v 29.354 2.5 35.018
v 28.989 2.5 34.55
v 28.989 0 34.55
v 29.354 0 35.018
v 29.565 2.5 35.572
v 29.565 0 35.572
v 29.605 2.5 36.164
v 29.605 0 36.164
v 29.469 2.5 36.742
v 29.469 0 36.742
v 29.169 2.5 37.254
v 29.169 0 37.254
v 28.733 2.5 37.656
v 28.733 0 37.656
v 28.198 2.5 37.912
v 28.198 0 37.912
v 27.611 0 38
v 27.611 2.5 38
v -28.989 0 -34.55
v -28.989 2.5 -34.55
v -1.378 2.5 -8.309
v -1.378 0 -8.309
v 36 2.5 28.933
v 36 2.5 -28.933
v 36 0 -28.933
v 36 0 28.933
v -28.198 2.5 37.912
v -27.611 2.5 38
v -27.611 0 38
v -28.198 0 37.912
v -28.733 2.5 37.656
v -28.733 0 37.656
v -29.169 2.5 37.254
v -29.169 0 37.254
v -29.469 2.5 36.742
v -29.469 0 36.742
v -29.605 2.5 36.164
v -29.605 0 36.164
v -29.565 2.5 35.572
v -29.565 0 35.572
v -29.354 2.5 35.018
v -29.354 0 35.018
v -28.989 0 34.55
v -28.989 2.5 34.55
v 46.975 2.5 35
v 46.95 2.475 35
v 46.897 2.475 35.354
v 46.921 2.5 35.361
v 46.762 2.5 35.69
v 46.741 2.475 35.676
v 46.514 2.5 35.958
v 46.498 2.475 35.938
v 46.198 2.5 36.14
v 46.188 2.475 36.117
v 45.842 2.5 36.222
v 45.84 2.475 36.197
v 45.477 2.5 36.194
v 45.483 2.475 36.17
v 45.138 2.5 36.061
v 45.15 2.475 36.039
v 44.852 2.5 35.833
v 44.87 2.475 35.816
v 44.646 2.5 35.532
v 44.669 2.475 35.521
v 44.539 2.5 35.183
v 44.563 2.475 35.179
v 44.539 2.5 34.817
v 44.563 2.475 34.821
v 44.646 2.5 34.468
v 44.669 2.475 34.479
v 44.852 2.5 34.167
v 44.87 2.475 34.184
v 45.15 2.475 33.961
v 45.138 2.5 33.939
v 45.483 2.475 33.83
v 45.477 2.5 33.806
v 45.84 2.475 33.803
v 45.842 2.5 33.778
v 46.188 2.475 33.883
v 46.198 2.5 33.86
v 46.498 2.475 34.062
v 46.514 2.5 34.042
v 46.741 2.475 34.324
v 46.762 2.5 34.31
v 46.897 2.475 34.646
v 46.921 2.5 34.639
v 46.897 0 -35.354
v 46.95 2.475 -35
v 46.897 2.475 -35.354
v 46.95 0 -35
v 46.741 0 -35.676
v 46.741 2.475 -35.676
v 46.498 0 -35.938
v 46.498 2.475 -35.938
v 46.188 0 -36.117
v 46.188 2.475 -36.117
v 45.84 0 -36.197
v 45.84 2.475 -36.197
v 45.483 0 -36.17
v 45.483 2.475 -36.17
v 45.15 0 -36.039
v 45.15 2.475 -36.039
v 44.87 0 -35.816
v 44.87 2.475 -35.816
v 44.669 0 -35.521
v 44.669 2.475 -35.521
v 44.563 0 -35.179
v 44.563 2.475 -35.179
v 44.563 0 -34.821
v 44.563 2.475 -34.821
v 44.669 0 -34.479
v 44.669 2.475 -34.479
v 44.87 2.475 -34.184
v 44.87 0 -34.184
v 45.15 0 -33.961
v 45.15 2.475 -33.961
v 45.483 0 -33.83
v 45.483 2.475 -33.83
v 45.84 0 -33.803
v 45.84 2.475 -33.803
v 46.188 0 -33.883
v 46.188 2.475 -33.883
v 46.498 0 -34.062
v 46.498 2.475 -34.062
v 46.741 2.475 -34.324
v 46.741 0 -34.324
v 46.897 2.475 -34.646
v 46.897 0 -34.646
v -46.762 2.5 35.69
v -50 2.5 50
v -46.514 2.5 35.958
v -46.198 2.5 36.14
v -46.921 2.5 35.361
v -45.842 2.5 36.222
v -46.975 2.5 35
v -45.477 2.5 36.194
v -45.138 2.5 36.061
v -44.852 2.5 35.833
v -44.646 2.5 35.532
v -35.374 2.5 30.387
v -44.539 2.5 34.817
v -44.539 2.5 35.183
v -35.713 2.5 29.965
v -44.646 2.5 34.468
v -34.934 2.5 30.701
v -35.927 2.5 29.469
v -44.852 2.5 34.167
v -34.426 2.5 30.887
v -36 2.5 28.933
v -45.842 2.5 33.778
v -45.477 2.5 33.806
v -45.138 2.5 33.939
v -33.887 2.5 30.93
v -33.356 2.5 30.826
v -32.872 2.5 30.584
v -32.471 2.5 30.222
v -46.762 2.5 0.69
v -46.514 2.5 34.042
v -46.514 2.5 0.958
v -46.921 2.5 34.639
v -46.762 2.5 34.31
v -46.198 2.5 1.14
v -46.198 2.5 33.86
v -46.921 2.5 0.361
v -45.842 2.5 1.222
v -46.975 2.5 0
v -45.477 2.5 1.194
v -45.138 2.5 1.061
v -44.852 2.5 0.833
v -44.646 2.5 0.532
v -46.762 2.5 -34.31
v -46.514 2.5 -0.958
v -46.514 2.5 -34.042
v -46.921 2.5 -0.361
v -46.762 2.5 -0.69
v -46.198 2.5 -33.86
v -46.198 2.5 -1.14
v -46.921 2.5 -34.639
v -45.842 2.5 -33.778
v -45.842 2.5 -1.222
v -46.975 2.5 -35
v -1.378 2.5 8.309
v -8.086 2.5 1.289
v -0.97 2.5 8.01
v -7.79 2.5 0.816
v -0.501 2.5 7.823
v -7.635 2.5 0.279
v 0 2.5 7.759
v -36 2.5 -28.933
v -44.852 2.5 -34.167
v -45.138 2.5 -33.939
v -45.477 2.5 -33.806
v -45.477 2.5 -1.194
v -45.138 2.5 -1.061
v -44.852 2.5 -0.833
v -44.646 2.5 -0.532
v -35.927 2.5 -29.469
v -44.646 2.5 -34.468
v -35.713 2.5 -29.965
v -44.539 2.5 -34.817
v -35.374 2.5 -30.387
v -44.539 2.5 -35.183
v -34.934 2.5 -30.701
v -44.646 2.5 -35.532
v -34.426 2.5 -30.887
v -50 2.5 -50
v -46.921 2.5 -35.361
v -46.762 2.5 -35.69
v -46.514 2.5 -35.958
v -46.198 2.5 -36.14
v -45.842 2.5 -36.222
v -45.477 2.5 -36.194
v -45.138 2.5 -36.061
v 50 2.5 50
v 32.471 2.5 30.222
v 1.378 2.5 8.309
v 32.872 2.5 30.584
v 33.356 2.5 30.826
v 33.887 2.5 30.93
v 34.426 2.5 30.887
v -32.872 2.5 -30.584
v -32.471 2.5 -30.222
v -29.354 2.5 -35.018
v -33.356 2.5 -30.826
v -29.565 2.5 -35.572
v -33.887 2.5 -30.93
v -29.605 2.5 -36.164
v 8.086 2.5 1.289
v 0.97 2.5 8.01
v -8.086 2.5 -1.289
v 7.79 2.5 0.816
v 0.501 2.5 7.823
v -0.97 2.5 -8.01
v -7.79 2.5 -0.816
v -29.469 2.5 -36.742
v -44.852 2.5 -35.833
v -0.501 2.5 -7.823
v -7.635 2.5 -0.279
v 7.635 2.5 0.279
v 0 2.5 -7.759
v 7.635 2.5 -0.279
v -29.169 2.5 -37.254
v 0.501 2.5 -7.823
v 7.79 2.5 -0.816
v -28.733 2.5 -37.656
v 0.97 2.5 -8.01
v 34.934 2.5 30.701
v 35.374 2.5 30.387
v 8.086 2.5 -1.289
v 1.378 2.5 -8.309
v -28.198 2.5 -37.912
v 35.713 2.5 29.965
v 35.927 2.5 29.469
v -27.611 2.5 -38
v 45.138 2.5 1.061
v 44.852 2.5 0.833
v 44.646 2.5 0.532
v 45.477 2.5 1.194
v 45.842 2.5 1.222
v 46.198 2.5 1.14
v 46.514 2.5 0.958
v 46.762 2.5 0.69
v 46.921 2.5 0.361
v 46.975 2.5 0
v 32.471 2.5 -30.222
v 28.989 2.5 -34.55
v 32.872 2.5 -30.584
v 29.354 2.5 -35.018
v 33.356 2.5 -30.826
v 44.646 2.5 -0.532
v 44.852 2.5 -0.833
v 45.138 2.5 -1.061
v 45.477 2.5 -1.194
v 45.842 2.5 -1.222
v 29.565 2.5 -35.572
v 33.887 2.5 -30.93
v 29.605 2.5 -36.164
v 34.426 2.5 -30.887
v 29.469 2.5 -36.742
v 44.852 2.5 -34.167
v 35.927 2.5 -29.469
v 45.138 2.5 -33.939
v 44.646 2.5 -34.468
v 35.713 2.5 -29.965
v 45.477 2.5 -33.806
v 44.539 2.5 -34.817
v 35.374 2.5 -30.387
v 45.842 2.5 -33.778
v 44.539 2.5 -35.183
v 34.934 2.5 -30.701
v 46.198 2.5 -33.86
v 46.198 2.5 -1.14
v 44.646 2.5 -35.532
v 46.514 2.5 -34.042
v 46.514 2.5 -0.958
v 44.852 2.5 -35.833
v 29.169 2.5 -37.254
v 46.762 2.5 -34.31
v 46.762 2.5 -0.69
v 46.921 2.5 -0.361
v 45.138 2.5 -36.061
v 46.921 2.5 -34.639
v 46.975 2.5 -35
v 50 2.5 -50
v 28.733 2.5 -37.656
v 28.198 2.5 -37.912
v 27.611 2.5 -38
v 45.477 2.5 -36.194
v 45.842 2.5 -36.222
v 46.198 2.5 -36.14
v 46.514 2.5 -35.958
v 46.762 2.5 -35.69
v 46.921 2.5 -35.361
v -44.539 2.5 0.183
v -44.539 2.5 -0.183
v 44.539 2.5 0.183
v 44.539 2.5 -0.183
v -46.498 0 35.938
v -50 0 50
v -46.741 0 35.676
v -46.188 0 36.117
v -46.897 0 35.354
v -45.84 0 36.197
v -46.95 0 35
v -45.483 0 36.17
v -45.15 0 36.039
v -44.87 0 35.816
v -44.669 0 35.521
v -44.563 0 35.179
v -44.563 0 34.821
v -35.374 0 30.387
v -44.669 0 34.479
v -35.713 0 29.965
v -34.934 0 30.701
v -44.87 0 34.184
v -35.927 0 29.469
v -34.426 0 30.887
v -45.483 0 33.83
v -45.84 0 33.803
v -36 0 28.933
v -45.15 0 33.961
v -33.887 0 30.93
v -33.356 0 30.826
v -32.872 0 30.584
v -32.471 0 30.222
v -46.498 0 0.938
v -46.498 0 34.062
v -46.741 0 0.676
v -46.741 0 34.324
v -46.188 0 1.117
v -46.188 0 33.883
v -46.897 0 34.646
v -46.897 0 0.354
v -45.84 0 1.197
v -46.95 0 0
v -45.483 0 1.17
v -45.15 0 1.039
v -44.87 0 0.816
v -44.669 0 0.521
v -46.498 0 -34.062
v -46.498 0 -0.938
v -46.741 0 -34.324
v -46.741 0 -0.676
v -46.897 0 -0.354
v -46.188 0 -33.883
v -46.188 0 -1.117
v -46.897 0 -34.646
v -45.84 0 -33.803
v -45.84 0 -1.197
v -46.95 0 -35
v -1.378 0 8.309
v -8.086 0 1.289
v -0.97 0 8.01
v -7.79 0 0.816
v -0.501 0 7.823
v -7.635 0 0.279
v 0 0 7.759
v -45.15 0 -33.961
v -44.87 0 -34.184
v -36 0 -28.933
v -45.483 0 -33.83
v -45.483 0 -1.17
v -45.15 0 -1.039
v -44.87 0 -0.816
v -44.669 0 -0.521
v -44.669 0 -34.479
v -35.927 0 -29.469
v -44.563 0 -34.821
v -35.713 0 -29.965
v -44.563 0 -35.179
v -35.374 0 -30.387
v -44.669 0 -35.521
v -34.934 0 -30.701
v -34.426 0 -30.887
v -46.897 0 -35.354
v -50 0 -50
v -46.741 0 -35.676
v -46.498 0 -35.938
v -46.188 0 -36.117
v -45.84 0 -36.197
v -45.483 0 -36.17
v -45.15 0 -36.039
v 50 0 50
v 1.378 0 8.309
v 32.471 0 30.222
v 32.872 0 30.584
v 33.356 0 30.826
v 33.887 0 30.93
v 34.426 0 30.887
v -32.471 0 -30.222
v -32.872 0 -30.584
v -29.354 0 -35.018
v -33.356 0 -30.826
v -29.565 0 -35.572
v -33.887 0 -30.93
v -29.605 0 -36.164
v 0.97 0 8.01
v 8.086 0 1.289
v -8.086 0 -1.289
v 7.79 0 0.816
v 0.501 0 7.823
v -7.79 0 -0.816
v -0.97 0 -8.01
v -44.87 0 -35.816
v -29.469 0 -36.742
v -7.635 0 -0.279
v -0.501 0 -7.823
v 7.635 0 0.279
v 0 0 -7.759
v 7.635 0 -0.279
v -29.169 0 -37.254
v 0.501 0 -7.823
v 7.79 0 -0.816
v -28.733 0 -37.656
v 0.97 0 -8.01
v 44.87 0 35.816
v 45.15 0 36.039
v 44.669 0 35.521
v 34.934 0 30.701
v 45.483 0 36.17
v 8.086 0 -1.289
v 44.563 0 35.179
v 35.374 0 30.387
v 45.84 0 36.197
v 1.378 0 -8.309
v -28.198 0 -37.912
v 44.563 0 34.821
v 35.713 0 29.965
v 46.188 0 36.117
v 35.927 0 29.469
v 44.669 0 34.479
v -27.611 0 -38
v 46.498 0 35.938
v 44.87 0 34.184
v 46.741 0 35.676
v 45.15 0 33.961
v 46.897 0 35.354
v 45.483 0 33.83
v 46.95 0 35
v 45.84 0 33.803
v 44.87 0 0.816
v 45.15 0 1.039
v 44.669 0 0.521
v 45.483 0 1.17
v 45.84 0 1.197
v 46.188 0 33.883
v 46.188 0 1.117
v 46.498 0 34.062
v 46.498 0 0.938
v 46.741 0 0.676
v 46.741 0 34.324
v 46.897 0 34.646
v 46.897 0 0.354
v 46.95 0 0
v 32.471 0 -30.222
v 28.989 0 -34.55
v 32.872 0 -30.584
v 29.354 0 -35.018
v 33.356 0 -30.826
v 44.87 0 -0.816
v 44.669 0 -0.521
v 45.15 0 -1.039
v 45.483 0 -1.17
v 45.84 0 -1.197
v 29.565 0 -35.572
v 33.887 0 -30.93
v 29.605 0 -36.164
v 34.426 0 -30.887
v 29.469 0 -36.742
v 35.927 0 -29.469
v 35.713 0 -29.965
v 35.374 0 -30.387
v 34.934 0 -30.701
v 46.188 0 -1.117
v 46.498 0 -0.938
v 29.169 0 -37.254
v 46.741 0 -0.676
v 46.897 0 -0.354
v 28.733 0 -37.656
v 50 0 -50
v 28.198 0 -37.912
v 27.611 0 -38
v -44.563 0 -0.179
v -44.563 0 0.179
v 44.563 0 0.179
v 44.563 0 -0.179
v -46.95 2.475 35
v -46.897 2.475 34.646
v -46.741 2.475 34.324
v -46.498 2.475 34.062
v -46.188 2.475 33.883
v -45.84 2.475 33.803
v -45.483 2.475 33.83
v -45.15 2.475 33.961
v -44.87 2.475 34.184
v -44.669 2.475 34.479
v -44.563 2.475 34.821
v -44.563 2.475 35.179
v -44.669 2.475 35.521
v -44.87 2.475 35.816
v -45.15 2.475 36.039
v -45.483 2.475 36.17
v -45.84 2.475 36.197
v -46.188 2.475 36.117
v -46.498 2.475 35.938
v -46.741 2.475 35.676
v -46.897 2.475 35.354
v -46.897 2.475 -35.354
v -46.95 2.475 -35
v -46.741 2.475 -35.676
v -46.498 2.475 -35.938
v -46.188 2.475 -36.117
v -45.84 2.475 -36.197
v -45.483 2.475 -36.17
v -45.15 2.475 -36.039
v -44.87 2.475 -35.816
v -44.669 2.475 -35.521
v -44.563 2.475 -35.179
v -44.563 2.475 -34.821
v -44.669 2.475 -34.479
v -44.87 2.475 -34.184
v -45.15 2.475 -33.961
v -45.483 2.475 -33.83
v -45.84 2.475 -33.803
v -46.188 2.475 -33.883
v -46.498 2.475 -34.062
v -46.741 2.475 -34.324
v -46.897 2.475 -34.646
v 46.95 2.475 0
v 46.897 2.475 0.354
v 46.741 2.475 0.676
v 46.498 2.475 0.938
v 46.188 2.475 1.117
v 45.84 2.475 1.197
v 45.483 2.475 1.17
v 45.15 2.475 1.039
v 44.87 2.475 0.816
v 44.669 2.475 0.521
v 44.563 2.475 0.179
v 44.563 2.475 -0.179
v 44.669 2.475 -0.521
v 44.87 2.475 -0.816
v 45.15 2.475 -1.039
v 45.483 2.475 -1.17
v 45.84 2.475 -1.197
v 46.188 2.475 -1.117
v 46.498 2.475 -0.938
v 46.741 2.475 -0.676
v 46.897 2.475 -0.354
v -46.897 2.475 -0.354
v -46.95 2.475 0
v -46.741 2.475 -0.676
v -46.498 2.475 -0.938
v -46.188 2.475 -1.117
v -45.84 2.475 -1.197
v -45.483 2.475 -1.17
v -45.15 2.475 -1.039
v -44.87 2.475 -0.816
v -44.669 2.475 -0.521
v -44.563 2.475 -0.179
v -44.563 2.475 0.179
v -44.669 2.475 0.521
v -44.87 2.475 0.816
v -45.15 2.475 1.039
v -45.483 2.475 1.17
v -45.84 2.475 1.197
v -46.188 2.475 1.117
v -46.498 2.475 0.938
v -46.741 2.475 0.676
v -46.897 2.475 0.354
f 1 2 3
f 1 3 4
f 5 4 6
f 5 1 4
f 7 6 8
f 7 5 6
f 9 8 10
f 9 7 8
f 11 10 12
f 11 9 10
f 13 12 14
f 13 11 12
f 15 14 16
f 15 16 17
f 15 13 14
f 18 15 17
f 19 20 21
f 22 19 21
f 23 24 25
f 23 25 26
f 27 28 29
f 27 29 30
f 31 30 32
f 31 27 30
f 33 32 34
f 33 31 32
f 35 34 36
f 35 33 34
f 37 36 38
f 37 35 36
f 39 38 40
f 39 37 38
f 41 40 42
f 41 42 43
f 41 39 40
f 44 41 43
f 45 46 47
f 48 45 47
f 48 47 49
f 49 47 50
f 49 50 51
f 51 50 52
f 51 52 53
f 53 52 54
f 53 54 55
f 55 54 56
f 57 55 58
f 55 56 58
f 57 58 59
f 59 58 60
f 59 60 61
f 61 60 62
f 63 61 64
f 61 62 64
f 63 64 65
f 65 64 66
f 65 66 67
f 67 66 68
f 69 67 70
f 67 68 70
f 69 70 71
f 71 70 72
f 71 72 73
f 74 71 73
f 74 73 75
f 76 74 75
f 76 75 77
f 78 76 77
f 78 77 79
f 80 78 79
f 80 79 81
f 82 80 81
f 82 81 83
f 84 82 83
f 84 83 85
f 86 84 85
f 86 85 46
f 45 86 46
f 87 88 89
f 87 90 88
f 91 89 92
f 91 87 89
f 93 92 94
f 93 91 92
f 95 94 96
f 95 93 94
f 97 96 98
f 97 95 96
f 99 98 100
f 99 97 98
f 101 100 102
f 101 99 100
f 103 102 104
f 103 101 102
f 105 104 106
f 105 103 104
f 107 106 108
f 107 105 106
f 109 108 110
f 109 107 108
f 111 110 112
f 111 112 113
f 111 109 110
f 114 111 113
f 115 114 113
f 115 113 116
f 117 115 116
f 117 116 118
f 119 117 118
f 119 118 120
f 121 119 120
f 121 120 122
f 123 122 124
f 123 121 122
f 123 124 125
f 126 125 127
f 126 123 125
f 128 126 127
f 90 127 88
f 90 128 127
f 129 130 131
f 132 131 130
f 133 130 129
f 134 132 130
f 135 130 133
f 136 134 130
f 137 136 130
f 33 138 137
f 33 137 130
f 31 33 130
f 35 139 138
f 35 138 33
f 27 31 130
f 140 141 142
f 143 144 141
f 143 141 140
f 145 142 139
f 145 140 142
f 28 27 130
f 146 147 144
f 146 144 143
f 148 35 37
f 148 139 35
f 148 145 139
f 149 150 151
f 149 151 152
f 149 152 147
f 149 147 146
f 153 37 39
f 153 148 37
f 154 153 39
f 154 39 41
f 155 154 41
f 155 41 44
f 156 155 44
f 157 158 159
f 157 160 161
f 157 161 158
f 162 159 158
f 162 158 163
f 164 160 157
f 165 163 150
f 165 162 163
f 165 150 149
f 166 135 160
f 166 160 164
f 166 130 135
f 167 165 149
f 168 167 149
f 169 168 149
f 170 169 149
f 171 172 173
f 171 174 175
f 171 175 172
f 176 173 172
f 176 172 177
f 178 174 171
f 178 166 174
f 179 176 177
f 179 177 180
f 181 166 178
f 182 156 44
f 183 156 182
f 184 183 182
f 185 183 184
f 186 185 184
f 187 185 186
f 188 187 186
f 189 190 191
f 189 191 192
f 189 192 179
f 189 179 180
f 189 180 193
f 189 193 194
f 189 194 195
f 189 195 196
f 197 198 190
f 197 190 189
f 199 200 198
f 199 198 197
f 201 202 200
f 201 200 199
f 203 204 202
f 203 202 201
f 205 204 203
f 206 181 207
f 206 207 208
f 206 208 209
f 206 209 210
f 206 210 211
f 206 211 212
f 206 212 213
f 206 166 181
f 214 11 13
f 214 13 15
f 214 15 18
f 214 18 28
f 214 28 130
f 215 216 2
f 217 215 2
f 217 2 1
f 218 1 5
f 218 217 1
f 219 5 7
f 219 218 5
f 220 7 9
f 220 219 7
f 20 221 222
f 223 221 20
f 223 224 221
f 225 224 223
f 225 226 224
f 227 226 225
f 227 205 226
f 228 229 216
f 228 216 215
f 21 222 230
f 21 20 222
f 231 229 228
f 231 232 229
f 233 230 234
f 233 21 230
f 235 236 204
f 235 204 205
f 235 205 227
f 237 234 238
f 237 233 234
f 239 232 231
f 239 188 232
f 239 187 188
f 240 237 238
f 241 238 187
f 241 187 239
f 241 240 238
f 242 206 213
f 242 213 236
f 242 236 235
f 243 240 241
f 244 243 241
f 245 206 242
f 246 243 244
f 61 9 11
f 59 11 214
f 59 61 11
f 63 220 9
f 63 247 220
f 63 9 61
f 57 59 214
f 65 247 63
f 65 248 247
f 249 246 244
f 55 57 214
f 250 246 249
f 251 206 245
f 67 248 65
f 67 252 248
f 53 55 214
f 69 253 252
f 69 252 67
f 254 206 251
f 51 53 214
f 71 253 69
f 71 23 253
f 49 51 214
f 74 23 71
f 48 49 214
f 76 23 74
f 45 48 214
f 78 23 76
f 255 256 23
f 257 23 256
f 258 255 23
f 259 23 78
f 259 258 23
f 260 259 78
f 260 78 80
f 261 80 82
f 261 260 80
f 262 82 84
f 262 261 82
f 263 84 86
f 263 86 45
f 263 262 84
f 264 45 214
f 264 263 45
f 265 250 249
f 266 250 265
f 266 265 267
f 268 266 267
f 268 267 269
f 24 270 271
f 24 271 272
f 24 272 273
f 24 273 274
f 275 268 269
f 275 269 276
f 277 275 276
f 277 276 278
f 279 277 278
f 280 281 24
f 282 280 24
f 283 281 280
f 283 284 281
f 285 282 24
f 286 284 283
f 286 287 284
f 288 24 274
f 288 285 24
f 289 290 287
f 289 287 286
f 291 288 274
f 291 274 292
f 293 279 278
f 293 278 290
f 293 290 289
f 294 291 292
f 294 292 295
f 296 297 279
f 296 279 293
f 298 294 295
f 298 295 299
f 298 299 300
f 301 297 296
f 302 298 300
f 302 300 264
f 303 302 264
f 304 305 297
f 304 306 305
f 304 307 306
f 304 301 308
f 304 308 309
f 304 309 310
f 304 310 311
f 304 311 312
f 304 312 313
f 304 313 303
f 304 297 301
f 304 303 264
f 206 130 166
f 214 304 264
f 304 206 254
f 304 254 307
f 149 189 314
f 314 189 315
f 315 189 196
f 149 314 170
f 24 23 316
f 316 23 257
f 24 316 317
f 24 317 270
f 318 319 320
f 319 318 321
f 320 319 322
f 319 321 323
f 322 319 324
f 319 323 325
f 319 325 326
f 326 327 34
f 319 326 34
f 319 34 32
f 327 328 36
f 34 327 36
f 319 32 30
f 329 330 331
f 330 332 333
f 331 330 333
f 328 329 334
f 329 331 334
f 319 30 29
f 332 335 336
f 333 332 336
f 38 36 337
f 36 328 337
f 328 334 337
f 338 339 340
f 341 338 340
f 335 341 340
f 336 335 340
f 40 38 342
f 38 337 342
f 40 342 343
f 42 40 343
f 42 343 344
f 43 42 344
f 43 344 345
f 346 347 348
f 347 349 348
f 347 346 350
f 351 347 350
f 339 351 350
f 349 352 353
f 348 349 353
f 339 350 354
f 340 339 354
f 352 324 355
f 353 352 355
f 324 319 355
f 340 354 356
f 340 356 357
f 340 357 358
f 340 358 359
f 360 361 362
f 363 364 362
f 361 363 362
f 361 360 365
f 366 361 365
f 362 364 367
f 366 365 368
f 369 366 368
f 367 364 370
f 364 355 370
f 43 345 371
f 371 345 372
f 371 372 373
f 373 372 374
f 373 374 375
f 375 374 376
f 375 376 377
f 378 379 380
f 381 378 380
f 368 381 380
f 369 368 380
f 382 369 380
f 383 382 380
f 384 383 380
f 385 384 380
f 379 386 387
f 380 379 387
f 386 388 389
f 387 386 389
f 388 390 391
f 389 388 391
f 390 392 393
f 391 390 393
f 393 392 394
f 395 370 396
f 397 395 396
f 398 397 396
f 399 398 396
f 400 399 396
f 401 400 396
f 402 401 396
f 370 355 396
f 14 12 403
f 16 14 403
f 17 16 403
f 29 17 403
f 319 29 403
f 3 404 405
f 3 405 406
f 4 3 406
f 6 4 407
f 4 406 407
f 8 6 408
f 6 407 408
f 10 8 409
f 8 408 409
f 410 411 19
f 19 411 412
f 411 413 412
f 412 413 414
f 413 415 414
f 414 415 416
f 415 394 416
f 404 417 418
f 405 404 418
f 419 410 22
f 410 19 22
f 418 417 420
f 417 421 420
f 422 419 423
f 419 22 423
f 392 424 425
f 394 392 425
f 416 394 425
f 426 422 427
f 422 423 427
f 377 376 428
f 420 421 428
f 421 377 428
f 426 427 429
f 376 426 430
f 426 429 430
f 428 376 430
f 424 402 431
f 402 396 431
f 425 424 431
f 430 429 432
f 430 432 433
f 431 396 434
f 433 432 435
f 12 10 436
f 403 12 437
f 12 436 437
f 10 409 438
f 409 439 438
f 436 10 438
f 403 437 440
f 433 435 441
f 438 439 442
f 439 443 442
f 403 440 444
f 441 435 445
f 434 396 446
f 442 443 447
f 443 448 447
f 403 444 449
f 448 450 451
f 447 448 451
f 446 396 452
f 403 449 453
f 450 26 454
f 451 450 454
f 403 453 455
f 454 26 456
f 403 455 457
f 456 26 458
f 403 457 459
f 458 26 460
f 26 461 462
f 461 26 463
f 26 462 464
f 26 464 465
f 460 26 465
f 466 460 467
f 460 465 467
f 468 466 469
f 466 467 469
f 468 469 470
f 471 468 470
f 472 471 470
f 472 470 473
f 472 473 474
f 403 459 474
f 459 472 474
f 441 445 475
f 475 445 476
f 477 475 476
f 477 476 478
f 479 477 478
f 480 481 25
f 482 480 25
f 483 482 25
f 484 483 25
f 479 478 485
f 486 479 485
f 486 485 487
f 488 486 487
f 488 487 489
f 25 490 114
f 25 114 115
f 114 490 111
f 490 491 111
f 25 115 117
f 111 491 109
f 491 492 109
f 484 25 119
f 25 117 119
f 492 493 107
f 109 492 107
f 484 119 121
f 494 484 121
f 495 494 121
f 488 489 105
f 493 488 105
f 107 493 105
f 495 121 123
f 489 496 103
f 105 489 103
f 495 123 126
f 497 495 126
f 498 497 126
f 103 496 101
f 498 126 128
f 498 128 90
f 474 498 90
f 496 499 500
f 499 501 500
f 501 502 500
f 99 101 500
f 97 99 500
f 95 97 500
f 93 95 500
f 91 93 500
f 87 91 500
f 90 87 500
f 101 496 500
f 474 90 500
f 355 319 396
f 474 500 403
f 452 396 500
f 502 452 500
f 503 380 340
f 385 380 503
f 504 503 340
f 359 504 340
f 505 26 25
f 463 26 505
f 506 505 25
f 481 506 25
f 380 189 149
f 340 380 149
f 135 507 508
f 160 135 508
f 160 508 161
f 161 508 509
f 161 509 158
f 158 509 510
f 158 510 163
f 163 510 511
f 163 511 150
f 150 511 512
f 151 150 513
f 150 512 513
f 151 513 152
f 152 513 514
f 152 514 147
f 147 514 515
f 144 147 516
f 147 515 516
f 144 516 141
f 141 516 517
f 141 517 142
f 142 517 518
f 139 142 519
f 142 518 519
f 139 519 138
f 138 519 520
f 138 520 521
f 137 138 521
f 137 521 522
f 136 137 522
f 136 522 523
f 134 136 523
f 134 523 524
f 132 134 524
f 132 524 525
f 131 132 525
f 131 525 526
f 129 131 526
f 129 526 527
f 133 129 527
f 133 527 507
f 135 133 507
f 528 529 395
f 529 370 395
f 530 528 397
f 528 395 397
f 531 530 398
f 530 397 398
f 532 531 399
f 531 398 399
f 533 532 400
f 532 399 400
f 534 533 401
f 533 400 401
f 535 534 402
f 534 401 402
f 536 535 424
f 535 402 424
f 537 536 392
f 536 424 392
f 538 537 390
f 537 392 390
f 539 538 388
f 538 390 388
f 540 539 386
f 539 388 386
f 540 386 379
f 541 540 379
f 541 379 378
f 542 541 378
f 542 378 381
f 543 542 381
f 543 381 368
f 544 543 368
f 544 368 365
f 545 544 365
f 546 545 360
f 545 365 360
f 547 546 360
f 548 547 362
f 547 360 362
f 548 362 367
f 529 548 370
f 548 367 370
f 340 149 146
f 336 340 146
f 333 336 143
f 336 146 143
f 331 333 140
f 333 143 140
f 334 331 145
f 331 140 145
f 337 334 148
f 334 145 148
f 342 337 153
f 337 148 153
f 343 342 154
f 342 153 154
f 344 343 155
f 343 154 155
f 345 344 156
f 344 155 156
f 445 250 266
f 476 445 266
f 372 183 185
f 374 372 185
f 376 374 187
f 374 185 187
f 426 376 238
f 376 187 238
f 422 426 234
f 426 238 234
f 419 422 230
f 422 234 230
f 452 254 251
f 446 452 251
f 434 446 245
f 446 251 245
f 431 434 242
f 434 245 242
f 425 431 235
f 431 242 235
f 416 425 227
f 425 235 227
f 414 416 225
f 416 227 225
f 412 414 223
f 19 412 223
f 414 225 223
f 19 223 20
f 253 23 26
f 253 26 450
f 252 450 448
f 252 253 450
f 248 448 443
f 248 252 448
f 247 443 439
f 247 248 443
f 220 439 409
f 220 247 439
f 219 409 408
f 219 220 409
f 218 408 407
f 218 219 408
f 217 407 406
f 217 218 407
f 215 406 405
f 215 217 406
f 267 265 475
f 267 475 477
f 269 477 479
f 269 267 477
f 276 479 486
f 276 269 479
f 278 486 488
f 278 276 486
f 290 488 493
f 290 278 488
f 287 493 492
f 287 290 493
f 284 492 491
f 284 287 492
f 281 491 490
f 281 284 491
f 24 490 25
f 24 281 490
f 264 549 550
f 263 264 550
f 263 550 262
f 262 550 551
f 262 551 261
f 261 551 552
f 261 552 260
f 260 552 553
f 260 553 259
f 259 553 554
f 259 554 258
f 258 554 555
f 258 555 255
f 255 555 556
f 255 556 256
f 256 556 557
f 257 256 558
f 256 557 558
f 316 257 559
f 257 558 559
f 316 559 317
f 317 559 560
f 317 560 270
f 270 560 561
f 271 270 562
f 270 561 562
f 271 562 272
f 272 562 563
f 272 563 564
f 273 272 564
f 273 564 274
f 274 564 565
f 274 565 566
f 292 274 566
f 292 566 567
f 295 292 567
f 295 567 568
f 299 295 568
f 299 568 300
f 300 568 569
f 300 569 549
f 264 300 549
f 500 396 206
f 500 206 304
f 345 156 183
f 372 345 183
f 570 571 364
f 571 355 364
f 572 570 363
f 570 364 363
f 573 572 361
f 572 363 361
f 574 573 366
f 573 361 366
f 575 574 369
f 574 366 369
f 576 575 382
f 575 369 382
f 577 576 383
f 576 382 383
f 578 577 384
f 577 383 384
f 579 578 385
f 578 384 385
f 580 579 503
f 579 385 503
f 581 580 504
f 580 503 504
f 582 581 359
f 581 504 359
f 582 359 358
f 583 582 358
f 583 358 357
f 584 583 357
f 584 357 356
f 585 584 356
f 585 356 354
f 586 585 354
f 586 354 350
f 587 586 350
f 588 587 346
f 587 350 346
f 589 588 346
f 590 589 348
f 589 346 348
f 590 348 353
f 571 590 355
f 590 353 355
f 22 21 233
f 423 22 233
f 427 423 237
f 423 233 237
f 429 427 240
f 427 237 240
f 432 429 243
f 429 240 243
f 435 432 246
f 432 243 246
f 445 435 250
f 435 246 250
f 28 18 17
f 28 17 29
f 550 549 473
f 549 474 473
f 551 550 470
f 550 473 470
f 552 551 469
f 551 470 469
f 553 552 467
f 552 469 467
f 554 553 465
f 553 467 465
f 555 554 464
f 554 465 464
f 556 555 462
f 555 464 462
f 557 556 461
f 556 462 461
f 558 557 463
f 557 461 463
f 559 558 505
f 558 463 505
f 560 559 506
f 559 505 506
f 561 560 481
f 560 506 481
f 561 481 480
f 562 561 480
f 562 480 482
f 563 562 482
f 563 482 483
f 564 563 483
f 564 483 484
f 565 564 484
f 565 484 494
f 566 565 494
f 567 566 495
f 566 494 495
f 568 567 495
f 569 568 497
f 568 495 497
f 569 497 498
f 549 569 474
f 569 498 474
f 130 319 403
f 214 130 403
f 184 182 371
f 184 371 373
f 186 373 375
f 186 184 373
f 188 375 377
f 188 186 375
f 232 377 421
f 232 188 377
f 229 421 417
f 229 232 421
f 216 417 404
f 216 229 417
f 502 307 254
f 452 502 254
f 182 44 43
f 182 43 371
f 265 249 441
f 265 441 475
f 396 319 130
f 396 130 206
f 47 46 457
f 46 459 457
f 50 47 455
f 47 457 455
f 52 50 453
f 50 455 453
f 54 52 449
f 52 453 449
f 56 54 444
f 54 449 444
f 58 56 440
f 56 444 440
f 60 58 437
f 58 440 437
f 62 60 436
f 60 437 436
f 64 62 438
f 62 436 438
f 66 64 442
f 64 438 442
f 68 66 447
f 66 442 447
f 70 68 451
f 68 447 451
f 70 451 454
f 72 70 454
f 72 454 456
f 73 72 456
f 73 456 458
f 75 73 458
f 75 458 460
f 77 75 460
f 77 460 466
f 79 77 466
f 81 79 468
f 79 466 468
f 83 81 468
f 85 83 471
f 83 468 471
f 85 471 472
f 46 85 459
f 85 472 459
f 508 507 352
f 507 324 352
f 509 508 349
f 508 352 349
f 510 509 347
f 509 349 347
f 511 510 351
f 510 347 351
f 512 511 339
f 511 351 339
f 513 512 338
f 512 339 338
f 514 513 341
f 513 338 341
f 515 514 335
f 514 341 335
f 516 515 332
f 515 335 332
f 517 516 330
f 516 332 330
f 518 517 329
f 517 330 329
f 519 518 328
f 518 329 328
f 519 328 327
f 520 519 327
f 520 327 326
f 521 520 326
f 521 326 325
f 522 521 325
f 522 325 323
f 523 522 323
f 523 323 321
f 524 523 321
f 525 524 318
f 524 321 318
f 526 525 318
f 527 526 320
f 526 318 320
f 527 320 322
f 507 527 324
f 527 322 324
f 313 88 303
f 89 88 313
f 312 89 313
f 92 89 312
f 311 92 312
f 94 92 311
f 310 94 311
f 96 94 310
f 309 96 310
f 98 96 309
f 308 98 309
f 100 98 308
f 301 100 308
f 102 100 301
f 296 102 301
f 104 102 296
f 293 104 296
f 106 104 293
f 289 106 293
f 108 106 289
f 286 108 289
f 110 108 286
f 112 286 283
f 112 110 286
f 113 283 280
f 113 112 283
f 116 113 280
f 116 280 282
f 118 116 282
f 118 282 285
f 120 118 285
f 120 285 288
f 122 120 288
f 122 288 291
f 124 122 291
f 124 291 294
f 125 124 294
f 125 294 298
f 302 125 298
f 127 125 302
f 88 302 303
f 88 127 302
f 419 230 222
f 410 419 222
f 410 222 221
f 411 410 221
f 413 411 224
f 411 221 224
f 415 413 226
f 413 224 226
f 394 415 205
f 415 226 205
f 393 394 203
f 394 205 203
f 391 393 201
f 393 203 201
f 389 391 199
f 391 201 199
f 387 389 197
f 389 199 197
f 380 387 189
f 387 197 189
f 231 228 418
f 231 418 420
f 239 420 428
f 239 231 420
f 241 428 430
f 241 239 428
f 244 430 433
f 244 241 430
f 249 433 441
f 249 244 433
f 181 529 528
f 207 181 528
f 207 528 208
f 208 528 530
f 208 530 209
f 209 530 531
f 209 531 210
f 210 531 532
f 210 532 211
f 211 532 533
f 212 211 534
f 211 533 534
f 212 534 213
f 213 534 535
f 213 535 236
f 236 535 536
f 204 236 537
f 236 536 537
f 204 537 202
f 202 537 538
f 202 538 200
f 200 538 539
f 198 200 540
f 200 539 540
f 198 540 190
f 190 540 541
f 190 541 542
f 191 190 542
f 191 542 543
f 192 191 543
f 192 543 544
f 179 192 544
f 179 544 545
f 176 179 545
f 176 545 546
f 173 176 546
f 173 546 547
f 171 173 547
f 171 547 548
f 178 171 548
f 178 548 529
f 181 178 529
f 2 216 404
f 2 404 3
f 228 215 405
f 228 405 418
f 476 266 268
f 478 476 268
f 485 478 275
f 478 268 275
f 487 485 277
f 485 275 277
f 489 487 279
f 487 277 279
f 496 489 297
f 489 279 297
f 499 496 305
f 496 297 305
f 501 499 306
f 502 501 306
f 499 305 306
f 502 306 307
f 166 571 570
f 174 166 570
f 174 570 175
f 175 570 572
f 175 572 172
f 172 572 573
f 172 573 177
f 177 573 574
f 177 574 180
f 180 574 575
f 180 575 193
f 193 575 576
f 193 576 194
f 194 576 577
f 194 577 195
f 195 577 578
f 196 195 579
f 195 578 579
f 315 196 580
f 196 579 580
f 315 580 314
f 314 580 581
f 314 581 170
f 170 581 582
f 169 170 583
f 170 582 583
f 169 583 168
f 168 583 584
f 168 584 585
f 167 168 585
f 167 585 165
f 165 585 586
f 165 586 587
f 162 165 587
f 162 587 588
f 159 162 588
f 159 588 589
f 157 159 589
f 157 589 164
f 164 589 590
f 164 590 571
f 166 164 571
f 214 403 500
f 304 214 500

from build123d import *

# Parameters (mm, degrees)
SKETCH2_W                      = 100
SKETCH2_H                      = 100
BOSS_EXTRUDE1_DEPTH            = 2.5
M2_CLEARANCE_HOLE1_D           = 2.4
M2_CLEARANCE_HOLE1_CSINK_D     = 2.45
M2_CLEARANCE_HOLE1_CSINK_ANGLE = 90
LPATTERN1_COUNT                = 3
LPATTERN1_PITCH                = 35
MIRROR1_COPY_1_D               = 2.4
MIRROR1_COPY_1_CSINK_D         = 2.45
MIRROR1_COPY_1_CSINK_ANGLE     = 90
MIRROR1_COPY_2_D               = 2.4
MIRROR1_COPY_2_CSINK_D         = 2.45
MIRROR1_COPY_2_CSINK_ANGLE     = 90
CUT_EXTRUDE1_DEPTH             = 2.5


with BuildPart() as part:
    # Sketch2 → Boss-Extrude1 (new body)
    with BuildSketch(Plane(origin=(0, 0, 0), x_dir=(1, 0, 0), z_dir=(0, 1, 0))):
        Rectangle(SKETCH2_W, SKETCH2_H)
    extrude(amount=BOSS_EXTRUDE1_DEPTH)

    # M2 Clearance Hole1 (through all)
    with Locations(Plane(origin=(0, 2.5, 0), x_dir=(1, 0, 0), z_dir=(0, 1, 0))):
        with Locations((-45.75, 35)):
            m2_clearance_hole1 = CounterSinkHole(M2_CLEARANCE_HOLE1_D / 2, M2_CLEARANCE_HOLE1_CSINK_D / 2, counter_sink_angle=M2_CLEARANCE_HOLE1_CSINK_ANGLE)

    # LPattern1: M2 Clearance Hole1 ×3
    with Locations(*[(0, 0, i * LPATTERN1_PITCH) for i in range(1, LPATTERN1_COUNT)]):
        add(m2_clearance_hole1, mode=Mode.SUBTRACT)

    # Mirror1: M2 Clearance Hole1 across plane
    add(m2_clearance_hole1.mirror(Plane(origin=(0, 0, 0), x_dir=(0, 0, 1), z_dir=(1, 0, 0))), mode=Mode.SUBTRACT)

    # Mirror1 copy 1 (through all)
    with Locations(Plane(origin=(0, 2.5, 35), x_dir=(-1, 0, 0), z_dir=(0, 1, 0))):
        with Locations((-45.75, -35)):
            CounterSinkHole(MIRROR1_COPY_1_D / 2, MIRROR1_COPY_1_CSINK_D / 2, counter_sink_angle=MIRROR1_COPY_1_CSINK_ANGLE)

    # Mirror1 copy 2 (through all)
    with Locations(Plane(origin=(0, 2.5, 70), x_dir=(-1, 0, 0), z_dir=(0, 1, 0))):
        with Locations((-45.75, -35)):
            CounterSinkHole(MIRROR1_COPY_2_D / 2, MIRROR1_COPY_2_CSINK_D / 2, counter_sink_angle=MIRROR1_COPY_2_CSINK_ANGLE)

    # Sketch5 → Cut-Extrude1 (cut)
    with BuildSketch(Plane(origin=(0, 2.5, 0), x_dir=(1, 0, 0), z_dir=(0, 1, 0))):
        with BuildLine():
            Line((1.377777778, 8.309393123), (28.989112389, 34.550266095))
            ThreePointArc((28.989112389, 34.550266095), (29.468680542, 36.741799228), (27.611334612, 38))
            Line((27.611334612, 38), (-27.611334612, 38))
            ThreePointArc((-27.611334612, 38), (-29.468680542, 36.741799228), (-28.989112389, 34.550266095))
            Line((-28.989112389, 34.550266095), (-1.377777778, 8.309393123))
            ThreePointArc((-1.377777778, 8.309393123), (0, 7.759127028), (1.377777778, 8.309393123))
        make_face()
        with BuildLine():
            Line((27.611334612, -38), (-27.611334612, -38))
            ThreePointArc((-27.611334612, -38), (-29.468680542, -36.741799228), (-28.989112389, -34.550266095))
            Line((-28.989112389, -34.550266095), (-1.377777778, -8.309393123))
            ThreePointArc((-1.377777778, -8.309393123), (0, -7.759127028), (1.377777778, -8.309393123))
            Line((1.377777778, -8.309393123), (28.989112389, -34.550266095))
            ThreePointArc((28.989112389, -34.550266095), (29.468680542, -36.741799228), (27.611334612, -38))
        make_face()
        with BuildLine():
            Line((-36, 28.932797546), (-36, -28.932797546))
            ThreePointArc((-36, -28.932797546), (-34.686074143, -30.811441278), (-32.47069773, -30.221686435))
            Line((-32.47069773, -30.221686435), (-8.086269602, -1.288888889))
            ThreePointArc((-8.086269602, -1.288888889), (-7.615571872, 0), (-8.086269602, 1.288888889))
            Line((-8.086269602, 1.288888889), (-32.47069773, 30.221686435))
            ThreePointArc((-32.47069773, 30.221686435), (-34.686074143, 30.811441278), (-36, 28.932797546))
        make_face()
        with BuildLine():
            Line((32.47069773, -30.221686435), (8.086269602, -1.288888889))
            ThreePointArc((8.086269602, -1.288888889), (7.615571872, 0), (8.086269602, 1.288888889))
            Line((8.086269602, 1.288888889), (32.47069773, 30.221686435))
            ThreePointArc((32.47069773, 30.221686435), (34.686074143, 30.811441278), (36, 28.932797546))
            Line((36, 28.932797546), (36, -28.932797546))
            ThreePointArc((36, -28.932797546), (34.686074143, -30.811441278), (32.47069773, -30.221686435))
        make_face()
    extrude(amount=-CUT_EXTRUDE1_DEPTH, mode=Mode.SUBTRACT)


solid = part.part
